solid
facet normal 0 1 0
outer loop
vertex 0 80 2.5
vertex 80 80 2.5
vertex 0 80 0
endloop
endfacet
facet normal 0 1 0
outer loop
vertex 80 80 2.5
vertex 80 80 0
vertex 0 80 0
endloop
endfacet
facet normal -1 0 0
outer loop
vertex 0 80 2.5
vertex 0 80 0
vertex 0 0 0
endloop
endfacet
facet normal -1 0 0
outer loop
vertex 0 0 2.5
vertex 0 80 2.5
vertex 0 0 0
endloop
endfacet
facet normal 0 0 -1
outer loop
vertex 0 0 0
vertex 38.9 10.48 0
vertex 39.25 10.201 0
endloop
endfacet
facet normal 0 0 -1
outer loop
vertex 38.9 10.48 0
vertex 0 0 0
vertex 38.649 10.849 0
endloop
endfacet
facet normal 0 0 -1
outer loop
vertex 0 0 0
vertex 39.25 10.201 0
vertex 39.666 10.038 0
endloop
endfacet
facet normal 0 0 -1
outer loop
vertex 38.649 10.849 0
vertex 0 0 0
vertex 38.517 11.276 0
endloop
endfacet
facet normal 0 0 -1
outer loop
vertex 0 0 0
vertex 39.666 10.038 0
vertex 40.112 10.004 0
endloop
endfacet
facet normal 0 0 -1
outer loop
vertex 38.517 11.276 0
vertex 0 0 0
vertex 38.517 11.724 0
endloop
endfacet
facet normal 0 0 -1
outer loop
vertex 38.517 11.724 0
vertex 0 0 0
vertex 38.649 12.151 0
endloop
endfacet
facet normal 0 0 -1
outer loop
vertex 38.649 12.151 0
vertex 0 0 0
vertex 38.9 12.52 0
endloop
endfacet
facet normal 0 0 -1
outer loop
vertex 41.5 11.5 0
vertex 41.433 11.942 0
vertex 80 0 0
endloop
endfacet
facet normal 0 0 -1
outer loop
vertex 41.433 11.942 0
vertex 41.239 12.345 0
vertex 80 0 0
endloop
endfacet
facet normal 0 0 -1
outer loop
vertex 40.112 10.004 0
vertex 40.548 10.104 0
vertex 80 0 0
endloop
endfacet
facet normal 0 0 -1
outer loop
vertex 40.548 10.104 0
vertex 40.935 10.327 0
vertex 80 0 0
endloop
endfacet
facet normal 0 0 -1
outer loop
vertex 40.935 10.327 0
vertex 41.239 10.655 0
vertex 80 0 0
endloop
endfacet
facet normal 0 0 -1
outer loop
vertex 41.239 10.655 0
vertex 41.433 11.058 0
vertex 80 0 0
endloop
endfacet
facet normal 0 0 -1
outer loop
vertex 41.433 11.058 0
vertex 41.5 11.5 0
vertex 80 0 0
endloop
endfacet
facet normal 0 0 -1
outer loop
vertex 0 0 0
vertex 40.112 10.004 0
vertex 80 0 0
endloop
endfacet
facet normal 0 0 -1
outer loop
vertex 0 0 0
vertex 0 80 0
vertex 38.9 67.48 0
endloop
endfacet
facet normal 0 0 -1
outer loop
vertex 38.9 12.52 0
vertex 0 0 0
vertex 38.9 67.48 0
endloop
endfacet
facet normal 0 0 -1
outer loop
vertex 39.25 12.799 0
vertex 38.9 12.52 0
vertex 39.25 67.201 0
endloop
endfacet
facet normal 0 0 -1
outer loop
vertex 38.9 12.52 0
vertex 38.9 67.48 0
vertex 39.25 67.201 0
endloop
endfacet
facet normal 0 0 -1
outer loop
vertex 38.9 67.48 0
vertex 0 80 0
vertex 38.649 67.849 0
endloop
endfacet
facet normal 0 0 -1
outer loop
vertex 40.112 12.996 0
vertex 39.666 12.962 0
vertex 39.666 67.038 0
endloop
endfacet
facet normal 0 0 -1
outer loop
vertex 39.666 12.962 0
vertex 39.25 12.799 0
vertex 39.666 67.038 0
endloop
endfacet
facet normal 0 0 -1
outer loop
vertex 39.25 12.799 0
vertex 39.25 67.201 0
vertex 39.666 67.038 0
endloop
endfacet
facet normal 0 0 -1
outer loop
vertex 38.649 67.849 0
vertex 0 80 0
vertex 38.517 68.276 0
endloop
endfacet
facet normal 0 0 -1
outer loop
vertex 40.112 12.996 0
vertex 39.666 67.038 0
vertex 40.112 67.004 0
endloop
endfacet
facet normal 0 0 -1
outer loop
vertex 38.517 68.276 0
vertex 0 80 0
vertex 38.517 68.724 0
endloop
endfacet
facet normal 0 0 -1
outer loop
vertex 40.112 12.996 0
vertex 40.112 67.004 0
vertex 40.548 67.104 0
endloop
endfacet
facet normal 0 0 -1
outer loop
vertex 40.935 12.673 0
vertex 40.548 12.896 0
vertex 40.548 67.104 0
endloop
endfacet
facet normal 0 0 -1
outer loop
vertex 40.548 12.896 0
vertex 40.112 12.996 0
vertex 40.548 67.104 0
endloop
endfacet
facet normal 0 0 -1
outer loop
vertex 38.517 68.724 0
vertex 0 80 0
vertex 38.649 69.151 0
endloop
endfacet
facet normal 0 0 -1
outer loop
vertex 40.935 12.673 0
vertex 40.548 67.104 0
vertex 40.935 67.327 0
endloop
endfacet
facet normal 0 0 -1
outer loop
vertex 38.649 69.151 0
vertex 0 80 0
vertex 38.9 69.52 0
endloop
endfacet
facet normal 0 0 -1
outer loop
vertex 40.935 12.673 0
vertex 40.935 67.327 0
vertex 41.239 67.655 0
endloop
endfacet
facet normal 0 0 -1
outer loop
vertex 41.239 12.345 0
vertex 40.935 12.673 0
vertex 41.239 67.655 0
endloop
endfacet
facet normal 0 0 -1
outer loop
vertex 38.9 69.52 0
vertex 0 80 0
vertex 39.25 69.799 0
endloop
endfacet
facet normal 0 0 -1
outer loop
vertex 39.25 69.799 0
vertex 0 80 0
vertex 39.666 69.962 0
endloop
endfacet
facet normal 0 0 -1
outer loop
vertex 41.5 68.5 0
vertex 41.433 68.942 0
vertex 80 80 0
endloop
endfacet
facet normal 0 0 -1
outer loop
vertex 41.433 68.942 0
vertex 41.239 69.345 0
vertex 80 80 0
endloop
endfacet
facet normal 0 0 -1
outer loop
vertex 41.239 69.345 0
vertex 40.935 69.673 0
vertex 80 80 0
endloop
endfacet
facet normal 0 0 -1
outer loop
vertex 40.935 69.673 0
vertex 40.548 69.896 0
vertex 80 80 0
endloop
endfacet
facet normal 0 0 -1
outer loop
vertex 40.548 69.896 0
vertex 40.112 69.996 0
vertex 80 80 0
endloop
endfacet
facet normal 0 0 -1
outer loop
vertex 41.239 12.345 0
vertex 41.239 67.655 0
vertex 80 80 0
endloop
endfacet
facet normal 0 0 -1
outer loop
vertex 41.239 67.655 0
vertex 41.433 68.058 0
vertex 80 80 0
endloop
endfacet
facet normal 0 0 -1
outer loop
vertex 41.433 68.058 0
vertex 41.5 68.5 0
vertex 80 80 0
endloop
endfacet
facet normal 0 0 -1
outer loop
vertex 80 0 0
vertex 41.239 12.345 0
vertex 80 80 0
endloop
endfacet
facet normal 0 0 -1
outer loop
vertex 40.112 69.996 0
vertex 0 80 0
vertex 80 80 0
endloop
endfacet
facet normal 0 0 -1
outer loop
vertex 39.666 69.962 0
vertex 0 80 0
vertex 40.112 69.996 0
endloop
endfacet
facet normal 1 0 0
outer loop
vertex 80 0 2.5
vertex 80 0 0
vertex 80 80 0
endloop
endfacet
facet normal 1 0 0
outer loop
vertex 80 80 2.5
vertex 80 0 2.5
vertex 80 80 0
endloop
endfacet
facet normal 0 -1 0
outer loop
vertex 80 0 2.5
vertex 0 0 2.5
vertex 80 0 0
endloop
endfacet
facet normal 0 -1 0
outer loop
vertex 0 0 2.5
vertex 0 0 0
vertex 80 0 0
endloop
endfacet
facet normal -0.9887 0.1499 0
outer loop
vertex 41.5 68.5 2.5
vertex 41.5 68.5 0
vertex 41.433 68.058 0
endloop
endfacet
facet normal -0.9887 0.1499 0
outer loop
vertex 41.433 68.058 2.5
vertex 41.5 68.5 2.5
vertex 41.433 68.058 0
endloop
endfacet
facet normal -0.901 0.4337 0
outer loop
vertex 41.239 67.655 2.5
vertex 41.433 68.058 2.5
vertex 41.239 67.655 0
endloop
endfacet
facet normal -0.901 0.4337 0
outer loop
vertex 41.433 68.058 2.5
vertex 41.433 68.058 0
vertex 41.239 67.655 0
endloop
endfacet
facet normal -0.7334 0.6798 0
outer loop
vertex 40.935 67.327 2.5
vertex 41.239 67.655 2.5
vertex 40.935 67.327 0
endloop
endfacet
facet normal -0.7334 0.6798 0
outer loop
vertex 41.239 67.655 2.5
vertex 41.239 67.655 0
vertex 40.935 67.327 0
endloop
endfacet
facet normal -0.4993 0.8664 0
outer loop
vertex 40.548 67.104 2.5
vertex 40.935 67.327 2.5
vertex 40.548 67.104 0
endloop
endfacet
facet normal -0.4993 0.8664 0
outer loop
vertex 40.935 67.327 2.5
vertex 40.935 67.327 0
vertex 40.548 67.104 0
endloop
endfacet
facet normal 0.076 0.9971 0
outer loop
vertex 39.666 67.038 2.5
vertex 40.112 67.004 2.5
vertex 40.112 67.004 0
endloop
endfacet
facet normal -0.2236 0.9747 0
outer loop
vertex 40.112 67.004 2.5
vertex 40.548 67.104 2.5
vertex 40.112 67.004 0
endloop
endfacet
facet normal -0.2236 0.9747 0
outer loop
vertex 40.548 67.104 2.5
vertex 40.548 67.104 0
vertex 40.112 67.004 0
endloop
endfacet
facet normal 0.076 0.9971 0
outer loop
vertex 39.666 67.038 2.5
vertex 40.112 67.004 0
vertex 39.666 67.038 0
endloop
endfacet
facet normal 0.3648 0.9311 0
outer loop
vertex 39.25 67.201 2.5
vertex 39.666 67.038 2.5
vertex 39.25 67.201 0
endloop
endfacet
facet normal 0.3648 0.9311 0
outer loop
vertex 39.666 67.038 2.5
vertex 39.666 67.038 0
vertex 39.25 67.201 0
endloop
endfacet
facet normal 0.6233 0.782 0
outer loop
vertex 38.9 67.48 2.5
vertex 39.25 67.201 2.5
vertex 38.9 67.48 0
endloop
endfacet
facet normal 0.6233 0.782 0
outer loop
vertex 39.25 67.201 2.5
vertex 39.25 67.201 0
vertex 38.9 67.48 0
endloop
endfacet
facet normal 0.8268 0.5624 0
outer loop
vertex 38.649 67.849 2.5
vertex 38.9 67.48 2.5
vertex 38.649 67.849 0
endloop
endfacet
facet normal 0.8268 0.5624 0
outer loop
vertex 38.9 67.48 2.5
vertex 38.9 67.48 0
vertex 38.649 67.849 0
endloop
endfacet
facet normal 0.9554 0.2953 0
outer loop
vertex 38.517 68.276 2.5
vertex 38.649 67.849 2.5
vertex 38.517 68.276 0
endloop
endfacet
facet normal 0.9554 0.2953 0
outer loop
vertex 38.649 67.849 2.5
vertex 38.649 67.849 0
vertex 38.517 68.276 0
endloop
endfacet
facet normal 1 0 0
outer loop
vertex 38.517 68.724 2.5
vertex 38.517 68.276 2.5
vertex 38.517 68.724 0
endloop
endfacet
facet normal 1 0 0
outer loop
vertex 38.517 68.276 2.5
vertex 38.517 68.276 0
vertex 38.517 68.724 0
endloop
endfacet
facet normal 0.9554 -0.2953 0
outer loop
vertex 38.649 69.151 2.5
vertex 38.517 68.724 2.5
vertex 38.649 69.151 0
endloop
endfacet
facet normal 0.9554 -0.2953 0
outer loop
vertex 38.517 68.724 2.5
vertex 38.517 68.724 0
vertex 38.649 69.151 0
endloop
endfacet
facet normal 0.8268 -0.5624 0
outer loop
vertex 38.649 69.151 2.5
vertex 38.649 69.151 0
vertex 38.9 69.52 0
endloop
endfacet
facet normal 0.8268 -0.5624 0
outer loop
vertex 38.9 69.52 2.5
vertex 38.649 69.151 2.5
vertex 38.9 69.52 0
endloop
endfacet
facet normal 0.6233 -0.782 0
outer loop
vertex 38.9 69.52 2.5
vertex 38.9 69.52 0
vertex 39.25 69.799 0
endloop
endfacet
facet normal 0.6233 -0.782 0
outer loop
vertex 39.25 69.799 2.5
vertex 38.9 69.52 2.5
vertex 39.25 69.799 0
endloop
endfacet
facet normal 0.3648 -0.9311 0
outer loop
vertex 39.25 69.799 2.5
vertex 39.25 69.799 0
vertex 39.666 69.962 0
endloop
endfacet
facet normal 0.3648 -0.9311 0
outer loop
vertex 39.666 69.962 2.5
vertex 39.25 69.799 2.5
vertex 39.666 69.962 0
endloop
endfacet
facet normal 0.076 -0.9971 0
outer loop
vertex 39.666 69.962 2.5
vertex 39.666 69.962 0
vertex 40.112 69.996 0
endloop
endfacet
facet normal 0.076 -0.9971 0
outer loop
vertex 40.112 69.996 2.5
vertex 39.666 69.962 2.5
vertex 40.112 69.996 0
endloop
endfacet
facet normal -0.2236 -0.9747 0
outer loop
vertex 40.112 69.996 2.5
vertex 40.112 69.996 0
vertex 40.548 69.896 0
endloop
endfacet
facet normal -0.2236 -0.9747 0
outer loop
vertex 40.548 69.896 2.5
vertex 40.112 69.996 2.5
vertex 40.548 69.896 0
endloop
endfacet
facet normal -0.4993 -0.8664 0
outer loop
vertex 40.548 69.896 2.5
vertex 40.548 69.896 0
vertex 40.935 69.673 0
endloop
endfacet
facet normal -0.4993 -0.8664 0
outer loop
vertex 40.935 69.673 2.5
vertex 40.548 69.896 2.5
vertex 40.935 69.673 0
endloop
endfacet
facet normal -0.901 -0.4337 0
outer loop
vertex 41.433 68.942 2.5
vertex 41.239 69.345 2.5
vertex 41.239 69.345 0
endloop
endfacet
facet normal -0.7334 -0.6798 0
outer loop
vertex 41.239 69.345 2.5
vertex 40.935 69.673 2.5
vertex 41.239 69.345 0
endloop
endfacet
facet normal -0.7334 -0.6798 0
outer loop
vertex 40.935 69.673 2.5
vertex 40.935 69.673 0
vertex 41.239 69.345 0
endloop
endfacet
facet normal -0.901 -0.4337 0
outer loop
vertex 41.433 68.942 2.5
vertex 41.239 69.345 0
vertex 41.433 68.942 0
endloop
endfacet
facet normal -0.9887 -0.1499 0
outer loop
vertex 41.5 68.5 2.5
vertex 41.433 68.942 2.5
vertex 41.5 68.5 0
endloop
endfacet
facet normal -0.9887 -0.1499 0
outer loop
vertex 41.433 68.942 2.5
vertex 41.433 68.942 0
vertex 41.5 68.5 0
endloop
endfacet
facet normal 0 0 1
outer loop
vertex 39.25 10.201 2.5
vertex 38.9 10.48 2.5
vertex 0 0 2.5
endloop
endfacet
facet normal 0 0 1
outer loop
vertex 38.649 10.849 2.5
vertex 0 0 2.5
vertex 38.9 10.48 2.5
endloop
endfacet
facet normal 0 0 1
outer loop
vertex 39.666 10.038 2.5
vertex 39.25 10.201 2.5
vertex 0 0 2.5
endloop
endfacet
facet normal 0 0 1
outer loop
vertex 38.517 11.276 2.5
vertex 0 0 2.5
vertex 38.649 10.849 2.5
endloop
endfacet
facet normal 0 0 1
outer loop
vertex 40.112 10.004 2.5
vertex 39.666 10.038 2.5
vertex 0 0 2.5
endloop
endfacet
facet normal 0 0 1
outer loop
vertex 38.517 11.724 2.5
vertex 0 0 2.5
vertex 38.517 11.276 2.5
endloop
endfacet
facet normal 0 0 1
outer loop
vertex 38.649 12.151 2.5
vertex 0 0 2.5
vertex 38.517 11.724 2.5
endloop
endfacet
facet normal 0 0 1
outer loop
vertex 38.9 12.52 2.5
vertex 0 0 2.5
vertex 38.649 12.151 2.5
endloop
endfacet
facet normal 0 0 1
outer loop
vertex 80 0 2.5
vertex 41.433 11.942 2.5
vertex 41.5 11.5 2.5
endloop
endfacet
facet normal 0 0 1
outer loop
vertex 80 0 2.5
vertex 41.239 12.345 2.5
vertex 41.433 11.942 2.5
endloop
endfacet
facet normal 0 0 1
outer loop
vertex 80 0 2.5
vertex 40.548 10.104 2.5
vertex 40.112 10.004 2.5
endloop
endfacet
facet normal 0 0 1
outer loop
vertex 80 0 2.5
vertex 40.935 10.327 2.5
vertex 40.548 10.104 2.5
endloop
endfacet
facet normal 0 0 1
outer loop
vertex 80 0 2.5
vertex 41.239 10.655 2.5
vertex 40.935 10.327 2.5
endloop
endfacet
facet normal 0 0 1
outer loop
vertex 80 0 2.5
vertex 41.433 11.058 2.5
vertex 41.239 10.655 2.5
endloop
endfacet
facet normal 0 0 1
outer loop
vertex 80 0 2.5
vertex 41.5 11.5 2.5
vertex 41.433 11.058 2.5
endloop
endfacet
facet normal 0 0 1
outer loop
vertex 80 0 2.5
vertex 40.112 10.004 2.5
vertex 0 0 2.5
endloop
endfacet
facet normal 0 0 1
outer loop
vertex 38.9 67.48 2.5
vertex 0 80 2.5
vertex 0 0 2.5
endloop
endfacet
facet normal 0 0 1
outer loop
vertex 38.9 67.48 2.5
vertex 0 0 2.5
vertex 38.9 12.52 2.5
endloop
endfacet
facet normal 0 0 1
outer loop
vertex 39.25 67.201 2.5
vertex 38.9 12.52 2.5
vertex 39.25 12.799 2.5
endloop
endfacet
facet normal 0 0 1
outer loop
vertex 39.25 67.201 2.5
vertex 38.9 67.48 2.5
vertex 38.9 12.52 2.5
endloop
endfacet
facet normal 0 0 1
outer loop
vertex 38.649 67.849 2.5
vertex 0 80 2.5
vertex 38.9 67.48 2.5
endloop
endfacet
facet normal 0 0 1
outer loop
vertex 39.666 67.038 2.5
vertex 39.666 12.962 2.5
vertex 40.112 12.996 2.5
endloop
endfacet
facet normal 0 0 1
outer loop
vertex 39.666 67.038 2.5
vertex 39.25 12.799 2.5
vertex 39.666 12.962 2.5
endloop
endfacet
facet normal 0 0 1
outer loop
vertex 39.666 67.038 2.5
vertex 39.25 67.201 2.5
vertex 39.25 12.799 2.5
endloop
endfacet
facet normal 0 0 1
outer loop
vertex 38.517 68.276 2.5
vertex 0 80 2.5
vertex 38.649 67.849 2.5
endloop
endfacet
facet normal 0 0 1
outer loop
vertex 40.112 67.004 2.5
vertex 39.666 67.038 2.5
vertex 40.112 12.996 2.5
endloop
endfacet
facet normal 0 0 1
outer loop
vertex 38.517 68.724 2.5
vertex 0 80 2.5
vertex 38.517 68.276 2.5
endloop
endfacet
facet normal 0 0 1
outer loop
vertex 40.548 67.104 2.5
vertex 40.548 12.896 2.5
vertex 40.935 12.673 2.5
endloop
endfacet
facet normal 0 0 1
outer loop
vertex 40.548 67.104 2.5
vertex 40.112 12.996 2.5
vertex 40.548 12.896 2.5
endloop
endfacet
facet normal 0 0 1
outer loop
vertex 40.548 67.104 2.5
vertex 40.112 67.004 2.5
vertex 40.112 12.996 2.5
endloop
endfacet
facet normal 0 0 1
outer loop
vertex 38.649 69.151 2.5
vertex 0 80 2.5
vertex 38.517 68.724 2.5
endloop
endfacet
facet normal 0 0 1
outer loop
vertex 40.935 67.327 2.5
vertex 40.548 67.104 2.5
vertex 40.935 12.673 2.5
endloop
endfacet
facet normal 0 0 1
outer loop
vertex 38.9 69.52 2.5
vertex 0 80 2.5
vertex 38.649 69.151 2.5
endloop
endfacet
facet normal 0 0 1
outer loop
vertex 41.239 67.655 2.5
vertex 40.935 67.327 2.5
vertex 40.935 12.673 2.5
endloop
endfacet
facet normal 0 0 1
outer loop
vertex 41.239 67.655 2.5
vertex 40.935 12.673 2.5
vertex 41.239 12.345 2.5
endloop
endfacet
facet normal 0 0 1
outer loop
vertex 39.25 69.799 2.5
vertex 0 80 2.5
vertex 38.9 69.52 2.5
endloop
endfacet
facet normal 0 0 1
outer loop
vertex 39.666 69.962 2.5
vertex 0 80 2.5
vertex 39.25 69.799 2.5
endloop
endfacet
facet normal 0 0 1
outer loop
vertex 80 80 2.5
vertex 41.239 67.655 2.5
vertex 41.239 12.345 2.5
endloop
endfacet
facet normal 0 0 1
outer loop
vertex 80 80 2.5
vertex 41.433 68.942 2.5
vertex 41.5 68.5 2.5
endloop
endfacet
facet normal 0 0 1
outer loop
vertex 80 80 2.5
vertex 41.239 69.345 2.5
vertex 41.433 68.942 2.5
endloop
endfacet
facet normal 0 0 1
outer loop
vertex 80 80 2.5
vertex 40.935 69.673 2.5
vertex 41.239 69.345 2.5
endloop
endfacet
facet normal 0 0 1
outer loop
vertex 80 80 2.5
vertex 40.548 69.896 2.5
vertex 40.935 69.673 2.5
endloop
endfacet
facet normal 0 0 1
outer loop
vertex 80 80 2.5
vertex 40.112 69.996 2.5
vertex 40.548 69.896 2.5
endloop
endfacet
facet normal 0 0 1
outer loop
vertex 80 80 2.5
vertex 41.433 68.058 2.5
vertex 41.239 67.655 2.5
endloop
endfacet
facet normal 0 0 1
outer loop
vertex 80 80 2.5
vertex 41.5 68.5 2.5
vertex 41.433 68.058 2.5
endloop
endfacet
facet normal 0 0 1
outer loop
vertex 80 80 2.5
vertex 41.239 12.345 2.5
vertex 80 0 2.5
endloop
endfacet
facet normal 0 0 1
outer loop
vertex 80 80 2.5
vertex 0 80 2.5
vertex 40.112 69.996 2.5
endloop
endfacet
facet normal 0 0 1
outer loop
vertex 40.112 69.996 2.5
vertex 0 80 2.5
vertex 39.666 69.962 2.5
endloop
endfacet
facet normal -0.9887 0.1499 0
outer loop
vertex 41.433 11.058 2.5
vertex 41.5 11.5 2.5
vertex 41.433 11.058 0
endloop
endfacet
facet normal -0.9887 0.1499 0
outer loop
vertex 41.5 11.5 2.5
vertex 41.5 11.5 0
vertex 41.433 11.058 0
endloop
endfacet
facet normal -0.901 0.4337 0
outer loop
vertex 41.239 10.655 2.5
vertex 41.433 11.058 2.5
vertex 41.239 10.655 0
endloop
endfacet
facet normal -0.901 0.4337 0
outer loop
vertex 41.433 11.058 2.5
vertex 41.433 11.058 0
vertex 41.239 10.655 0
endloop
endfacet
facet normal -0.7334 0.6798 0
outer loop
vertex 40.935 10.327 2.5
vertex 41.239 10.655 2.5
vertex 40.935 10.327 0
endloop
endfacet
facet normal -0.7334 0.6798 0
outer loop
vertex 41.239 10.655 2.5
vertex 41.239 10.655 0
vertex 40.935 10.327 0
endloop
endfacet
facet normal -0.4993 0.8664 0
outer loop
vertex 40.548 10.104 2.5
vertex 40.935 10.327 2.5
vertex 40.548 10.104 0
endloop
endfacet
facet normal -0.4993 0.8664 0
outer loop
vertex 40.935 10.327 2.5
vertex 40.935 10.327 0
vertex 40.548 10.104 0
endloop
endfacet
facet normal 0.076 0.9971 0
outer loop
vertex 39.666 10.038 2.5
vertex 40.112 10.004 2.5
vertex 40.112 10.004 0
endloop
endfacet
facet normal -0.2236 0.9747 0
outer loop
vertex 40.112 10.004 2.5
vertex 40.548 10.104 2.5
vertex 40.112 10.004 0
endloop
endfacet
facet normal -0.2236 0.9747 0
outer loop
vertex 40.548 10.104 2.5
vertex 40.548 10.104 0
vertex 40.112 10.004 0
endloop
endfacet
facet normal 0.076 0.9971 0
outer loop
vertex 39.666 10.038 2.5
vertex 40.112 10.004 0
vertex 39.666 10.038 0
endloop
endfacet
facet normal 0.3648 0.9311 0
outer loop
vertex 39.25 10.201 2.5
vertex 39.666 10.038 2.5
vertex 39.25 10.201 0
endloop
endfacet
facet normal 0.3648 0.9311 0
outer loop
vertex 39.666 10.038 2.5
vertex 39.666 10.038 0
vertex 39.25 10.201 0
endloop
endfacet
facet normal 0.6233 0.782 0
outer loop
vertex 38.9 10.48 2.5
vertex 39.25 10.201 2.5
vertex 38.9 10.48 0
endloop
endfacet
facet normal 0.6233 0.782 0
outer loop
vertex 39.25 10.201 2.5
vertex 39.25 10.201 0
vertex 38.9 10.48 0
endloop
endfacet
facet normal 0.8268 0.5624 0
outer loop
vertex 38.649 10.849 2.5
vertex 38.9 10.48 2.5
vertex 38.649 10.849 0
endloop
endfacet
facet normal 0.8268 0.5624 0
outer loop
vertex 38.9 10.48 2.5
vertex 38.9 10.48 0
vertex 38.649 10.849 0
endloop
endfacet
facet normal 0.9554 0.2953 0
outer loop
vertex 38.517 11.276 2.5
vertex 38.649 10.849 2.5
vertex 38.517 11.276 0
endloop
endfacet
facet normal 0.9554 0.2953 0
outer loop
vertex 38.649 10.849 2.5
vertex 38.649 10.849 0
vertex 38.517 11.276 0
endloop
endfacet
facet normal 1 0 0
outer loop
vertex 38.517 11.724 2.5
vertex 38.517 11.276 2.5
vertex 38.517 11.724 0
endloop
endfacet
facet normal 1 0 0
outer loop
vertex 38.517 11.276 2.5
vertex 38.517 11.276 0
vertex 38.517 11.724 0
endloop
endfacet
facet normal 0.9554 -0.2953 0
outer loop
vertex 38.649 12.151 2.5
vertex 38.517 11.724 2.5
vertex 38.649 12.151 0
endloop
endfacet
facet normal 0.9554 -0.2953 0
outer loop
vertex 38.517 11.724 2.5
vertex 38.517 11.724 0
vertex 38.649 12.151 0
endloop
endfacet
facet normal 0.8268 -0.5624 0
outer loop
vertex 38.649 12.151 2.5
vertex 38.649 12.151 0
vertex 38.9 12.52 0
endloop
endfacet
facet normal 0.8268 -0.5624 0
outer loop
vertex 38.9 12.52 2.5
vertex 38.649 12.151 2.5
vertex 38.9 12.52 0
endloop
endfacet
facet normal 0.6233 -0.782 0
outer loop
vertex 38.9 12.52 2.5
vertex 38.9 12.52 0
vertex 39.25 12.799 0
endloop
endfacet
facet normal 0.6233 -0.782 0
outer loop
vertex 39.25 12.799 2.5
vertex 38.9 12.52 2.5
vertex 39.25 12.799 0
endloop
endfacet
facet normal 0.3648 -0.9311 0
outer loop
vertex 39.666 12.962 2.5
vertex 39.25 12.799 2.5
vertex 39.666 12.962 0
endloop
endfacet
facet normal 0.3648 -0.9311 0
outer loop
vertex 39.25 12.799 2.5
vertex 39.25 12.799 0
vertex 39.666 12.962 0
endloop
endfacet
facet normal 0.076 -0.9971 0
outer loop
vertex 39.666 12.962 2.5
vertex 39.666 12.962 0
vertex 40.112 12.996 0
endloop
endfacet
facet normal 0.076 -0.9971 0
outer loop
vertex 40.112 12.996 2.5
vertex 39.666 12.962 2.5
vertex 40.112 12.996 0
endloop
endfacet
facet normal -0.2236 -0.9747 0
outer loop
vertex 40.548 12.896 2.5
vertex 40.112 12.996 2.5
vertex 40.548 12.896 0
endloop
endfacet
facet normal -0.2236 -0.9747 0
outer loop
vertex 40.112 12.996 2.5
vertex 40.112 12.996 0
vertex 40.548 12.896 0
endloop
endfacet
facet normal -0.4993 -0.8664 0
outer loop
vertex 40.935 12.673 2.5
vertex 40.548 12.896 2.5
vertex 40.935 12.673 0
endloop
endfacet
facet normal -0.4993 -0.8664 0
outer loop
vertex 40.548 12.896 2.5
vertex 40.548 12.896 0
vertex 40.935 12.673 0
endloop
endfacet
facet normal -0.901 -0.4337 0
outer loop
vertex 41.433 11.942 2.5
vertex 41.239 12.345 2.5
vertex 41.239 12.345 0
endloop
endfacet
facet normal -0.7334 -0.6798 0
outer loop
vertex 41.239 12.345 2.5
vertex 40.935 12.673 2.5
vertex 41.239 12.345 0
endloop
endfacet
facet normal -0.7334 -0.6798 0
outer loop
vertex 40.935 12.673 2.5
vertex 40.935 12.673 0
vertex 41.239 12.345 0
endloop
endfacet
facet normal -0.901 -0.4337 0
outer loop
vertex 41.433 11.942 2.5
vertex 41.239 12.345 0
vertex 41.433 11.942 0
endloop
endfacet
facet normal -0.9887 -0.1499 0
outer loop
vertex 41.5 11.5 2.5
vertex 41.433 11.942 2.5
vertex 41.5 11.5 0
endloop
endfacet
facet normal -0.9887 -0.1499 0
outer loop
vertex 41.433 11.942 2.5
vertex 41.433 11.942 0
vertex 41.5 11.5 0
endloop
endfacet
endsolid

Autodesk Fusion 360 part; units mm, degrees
sketch "Sketch1" plane through (0, 0, 0) normal (0, 0, 1) x (1, 0, 0)
  line L0 (0, 0) -> (80, 0)
  line L1 (80, 0) -> (80, 80)
  line L2 (80, 80) -> (0, 80)
  line L3 (0, 80) -> (0, 0)
  circle A0 centre (40, 68.5) radius 1.5
  circle A1 centre (40, 11.5) radius 1.5
  dimension "d1" = 80
  dimension "d2" = 80
  dimension "d3" = 3
  dimension "d4" = 3
  dimension "d5" = 57
  dimension "d6" = 40
  dimension "d7" = 40
  dimension "d8" = 11.5
extrude "Extrude1" add sketch "Sketch1" along normal blind 2.5
